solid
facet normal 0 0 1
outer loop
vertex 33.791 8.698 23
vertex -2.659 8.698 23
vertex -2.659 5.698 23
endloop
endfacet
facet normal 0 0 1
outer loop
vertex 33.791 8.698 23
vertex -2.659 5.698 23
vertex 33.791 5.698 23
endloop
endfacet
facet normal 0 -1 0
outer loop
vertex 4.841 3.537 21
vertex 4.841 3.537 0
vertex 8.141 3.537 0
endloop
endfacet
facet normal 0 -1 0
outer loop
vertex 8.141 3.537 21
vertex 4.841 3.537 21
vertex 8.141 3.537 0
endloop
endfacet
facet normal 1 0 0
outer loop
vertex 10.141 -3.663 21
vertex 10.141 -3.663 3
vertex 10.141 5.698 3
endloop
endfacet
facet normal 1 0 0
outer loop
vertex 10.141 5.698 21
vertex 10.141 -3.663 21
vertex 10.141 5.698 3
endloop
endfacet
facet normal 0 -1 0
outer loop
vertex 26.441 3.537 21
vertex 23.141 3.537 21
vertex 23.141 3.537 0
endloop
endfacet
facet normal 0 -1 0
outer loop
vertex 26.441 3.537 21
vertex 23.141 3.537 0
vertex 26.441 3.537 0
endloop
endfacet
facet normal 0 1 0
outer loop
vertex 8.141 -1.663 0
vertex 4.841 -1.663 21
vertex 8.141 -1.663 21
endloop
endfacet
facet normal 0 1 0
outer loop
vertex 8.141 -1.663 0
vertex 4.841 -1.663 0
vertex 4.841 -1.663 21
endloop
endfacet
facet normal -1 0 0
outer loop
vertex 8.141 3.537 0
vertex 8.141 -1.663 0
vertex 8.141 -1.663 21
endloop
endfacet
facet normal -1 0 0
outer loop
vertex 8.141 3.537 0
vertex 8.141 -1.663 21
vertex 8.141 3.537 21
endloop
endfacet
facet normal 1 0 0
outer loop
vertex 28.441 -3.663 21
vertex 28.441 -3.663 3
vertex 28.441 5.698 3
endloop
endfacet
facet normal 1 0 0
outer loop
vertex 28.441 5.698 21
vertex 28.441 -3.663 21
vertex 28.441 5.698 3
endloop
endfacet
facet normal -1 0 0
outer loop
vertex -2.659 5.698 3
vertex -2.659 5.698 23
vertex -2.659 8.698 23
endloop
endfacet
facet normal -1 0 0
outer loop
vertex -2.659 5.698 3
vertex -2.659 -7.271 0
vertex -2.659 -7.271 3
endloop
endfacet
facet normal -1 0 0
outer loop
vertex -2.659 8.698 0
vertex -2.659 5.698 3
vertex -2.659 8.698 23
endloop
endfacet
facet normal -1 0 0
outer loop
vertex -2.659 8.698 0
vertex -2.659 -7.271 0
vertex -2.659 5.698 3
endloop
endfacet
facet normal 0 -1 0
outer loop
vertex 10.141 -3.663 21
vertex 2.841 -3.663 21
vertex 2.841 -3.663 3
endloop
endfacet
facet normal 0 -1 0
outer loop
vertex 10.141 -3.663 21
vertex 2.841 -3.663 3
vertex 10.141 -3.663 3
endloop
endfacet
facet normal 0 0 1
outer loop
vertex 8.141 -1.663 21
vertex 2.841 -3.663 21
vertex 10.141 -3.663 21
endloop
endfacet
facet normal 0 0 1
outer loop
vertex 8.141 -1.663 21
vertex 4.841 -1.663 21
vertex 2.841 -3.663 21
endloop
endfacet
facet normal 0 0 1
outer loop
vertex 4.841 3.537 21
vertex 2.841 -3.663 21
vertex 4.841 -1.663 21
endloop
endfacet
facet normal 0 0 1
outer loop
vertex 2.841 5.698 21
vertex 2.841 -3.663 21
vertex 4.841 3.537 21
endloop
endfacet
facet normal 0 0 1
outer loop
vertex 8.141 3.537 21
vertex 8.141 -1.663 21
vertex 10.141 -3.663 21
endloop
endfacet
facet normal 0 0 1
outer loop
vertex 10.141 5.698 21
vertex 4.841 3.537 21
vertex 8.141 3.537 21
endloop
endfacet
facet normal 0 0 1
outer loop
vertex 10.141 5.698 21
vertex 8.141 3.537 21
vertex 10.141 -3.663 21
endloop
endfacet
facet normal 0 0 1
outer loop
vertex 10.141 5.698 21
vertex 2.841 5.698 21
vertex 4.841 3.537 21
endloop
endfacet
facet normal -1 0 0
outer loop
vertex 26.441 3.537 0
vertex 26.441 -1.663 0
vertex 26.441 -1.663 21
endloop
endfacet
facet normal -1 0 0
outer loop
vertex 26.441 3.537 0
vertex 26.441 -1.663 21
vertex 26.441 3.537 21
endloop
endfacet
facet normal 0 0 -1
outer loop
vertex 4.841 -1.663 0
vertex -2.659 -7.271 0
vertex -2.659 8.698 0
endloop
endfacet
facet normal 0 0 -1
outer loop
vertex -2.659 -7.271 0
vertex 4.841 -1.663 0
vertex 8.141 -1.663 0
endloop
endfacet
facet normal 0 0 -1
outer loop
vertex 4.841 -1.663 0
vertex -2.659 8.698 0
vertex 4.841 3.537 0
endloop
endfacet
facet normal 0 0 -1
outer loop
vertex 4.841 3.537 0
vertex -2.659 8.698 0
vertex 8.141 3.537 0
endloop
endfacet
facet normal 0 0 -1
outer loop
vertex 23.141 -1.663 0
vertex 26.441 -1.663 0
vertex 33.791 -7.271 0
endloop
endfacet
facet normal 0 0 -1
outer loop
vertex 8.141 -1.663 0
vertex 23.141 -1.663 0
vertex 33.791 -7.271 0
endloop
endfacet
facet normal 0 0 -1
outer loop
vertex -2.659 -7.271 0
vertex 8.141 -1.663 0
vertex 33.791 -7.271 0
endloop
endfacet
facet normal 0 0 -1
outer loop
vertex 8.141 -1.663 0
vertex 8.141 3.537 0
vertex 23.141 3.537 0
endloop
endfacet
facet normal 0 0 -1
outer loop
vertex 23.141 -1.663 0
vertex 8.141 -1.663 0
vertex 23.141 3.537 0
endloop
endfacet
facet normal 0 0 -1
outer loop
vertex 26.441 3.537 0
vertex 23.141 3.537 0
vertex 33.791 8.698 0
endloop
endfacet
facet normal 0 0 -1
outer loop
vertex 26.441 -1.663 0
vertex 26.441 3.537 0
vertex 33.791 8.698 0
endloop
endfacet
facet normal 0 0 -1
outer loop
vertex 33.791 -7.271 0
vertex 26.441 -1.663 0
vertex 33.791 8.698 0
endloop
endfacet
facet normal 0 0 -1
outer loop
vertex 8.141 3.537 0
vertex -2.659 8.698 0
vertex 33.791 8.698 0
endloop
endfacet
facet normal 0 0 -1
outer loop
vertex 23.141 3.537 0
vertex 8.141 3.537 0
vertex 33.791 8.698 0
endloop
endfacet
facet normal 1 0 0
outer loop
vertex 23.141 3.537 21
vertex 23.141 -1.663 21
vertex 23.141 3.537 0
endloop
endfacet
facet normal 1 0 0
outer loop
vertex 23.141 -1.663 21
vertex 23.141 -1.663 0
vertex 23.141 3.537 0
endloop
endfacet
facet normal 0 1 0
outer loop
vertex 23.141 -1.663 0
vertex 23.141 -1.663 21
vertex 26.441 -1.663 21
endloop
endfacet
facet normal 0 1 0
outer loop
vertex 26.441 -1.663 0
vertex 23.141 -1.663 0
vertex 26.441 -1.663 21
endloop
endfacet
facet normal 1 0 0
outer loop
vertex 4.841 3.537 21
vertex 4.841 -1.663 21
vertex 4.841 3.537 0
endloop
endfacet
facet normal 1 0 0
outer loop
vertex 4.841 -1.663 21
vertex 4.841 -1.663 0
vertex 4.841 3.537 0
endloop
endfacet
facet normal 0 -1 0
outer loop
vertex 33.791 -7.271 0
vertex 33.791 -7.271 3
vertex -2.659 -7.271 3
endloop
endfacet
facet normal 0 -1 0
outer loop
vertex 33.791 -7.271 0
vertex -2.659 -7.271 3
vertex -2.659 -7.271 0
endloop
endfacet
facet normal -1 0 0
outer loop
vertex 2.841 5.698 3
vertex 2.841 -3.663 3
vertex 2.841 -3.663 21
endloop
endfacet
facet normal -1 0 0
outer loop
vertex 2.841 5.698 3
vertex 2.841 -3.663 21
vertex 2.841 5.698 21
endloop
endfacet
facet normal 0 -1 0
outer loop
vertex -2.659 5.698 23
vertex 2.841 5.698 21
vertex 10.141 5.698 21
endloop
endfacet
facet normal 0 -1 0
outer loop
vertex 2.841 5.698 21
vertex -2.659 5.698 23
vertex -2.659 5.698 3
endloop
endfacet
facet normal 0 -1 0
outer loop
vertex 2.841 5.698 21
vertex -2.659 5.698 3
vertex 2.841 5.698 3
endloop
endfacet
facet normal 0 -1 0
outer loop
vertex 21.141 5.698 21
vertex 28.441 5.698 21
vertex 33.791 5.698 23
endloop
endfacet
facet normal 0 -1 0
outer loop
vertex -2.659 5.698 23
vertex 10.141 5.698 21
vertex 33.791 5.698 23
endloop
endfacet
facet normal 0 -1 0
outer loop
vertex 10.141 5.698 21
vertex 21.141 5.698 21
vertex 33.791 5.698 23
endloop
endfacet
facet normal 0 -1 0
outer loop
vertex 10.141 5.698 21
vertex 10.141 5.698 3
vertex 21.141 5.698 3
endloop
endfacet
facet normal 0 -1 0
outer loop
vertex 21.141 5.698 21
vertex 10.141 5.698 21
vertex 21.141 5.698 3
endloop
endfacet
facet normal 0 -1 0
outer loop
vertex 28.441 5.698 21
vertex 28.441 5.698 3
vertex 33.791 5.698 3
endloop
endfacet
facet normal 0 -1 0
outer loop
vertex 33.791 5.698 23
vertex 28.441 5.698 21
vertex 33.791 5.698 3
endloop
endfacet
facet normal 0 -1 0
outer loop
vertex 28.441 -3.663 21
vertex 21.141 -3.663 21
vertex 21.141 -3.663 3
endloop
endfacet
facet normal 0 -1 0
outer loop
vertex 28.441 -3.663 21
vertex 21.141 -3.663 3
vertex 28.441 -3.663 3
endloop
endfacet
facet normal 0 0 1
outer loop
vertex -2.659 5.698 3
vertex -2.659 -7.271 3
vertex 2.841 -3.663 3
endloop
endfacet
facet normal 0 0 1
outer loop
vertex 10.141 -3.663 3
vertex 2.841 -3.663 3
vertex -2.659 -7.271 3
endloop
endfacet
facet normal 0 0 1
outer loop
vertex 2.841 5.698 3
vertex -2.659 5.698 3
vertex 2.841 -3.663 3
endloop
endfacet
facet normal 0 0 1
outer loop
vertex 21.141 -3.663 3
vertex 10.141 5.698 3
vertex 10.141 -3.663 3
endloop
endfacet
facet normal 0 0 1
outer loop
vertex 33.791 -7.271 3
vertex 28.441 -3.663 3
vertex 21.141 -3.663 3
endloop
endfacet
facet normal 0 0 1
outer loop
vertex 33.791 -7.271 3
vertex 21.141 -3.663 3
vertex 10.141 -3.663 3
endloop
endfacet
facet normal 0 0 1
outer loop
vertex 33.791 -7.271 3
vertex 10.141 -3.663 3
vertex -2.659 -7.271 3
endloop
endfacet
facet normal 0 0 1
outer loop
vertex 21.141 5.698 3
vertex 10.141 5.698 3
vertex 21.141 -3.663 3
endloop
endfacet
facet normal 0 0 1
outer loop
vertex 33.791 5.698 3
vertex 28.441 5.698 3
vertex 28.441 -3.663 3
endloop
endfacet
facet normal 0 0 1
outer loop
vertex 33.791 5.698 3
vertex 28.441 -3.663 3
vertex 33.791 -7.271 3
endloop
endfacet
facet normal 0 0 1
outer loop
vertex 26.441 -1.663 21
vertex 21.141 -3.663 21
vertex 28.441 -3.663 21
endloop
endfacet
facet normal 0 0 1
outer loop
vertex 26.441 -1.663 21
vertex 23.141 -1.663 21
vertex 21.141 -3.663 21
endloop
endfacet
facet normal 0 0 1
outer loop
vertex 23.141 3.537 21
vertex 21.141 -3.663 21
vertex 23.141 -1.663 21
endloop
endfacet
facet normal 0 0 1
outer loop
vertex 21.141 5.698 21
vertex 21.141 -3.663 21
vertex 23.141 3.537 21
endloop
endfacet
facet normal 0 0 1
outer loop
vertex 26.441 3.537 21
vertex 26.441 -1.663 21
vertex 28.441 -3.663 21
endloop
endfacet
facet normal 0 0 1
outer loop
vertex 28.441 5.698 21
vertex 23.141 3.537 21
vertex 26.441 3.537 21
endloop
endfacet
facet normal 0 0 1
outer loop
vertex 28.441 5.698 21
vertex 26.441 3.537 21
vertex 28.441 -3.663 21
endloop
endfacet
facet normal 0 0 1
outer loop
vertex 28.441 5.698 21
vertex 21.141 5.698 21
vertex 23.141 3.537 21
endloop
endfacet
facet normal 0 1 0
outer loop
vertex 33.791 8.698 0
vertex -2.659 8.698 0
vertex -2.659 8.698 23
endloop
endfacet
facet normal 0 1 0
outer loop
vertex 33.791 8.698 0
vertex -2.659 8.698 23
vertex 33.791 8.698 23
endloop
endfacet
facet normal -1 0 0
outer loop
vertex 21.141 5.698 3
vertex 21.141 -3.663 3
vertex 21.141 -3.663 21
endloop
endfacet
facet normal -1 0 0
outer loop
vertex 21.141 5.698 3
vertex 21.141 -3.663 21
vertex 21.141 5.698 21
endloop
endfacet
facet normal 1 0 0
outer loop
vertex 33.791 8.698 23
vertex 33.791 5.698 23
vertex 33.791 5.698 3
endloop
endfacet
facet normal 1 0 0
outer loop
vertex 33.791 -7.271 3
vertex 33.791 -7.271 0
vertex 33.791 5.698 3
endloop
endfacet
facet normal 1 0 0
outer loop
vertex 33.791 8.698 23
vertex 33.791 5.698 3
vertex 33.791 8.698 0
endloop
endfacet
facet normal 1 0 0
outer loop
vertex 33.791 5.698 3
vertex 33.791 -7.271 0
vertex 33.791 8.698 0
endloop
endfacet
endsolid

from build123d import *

# Parameters (mm, degrees)
SKETCH1_W              = 36.45
SKETCH1_H              = 25.4
BOSS_EXTRUDE1_DEPTH    = 3
CUT_EXTRUDE2_START     = -3
CUT_EXTRUDE2_OUTLINE_W = 3.3
CUT_EXTRUDE2_OUTLINE_H = 5.2
CUT_EXTRUDE2_DEPTH     = 3
SKETCH2_W              = 36.45
SKETCH2_H              = 3
BOSS_EXTRUDE3_DEPTH    = 20
SKETCH5_W              = 7.3
SKETCH5_H              = 9.361177697
SKETCH5_W_2            = 3.3
SKETCH5_H_2            = 5.2
BOSS_EXTRUDE4_DEPTH    = 18
SKETCH8_W              = 29.52669185
SKETCH8_H              = 10.957410593
CUT_EXTRUDE4_DEPTH     = 47.222944791


# Read off the part's stored shape, not the designer's step: Cut-Extrude2
with BuildPart() as part:
    # Sketch1 → Boss-Extrude1 (new body)
    with BuildSketch(Plane.XY):
        with Locations((15.565968828, -4.002039549)):
            Rectangle(SKETCH1_W, SKETCH1_H)
    extrude(amount=BOSS_EXTRUDE1_DEPTH)

    # Cut-Extrude2 outline → Cut-Extrude2 (cut)
    with BuildSketch(Plane.XY.offset(3).offset(CUT_EXTRUDE2_START)):
        with Locations((24.790968828, 0.936782754)):
            Rectangle(CUT_EXTRUDE2_OUTLINE_W, CUT_EXTRUDE2_OUTLINE_H)
        with Locations((6.490968828, 0.936782754)):
            Rectangle(CUT_EXTRUDE2_OUTLINE_W, CUT_EXTRUDE2_OUTLINE_H)
    extrude(amount=CUT_EXTRUDE2_DEPTH, mode=Mode.SUBTRACT)

    # Sketch2 → Boss-Extrude3 (add)
    with BuildSketch(Plane.XY.offset(3)):
        with Locations((15.565968828, 7.197960451)):
            Rectangle(SKETCH2_W, SKETCH2_H)
        with Locations((15.565968828, -15.202039549)):
            Rectangle(SKETCH2_W, SKETCH2_H)
    extrude(amount=BOSS_EXTRUDE3_DEPTH)

    # Sketch5 → Boss-Extrude4 (add)
    # profile 1 of 2: a face of its own
    with BuildSketch(Plane.XY.offset(3)):
        with Locations((6.490968828, 1.017371602)):
            Rectangle(SKETCH5_W, SKETCH5_H)
        with Locations((6.490968828, 0.936782754)):
            Rectangle(SKETCH5_W_2, SKETCH5_H_2, mode=Mode.SUBTRACT)
    # profile 2 of 2: a face of its own
    with BuildSketch(Plane.XY.offset(3)):
        with Locations((24.790968828, 1.017371602)):
            Rectangle(SKETCH5_W, SKETCH5_H)
        with Locations((24.790968828, 0.936782754)):
            Rectangle(SKETCH5_W_2, SKETCH5_H_2, mode=Mode.SUBTRACT)
    extrude(amount=BOSS_EXTRUDE4_DEPTH)

    # Sketch8 → Cut-Extrude4 (cut, through all)
    with BuildSketch(Plane(origin=(33.790968828, 0, 0), x_dir=(0, 0, -1), z_dir=(1, 0, 0))):
        with Locations((-9.750497468, -12.749552208)):
            Rectangle(SKETCH8_W, SKETCH8_H)
    extrude(amount=-CUT_EXTRUDE4_DEPTH, mode=Mode.SUBTRACT)


solid = part.part
